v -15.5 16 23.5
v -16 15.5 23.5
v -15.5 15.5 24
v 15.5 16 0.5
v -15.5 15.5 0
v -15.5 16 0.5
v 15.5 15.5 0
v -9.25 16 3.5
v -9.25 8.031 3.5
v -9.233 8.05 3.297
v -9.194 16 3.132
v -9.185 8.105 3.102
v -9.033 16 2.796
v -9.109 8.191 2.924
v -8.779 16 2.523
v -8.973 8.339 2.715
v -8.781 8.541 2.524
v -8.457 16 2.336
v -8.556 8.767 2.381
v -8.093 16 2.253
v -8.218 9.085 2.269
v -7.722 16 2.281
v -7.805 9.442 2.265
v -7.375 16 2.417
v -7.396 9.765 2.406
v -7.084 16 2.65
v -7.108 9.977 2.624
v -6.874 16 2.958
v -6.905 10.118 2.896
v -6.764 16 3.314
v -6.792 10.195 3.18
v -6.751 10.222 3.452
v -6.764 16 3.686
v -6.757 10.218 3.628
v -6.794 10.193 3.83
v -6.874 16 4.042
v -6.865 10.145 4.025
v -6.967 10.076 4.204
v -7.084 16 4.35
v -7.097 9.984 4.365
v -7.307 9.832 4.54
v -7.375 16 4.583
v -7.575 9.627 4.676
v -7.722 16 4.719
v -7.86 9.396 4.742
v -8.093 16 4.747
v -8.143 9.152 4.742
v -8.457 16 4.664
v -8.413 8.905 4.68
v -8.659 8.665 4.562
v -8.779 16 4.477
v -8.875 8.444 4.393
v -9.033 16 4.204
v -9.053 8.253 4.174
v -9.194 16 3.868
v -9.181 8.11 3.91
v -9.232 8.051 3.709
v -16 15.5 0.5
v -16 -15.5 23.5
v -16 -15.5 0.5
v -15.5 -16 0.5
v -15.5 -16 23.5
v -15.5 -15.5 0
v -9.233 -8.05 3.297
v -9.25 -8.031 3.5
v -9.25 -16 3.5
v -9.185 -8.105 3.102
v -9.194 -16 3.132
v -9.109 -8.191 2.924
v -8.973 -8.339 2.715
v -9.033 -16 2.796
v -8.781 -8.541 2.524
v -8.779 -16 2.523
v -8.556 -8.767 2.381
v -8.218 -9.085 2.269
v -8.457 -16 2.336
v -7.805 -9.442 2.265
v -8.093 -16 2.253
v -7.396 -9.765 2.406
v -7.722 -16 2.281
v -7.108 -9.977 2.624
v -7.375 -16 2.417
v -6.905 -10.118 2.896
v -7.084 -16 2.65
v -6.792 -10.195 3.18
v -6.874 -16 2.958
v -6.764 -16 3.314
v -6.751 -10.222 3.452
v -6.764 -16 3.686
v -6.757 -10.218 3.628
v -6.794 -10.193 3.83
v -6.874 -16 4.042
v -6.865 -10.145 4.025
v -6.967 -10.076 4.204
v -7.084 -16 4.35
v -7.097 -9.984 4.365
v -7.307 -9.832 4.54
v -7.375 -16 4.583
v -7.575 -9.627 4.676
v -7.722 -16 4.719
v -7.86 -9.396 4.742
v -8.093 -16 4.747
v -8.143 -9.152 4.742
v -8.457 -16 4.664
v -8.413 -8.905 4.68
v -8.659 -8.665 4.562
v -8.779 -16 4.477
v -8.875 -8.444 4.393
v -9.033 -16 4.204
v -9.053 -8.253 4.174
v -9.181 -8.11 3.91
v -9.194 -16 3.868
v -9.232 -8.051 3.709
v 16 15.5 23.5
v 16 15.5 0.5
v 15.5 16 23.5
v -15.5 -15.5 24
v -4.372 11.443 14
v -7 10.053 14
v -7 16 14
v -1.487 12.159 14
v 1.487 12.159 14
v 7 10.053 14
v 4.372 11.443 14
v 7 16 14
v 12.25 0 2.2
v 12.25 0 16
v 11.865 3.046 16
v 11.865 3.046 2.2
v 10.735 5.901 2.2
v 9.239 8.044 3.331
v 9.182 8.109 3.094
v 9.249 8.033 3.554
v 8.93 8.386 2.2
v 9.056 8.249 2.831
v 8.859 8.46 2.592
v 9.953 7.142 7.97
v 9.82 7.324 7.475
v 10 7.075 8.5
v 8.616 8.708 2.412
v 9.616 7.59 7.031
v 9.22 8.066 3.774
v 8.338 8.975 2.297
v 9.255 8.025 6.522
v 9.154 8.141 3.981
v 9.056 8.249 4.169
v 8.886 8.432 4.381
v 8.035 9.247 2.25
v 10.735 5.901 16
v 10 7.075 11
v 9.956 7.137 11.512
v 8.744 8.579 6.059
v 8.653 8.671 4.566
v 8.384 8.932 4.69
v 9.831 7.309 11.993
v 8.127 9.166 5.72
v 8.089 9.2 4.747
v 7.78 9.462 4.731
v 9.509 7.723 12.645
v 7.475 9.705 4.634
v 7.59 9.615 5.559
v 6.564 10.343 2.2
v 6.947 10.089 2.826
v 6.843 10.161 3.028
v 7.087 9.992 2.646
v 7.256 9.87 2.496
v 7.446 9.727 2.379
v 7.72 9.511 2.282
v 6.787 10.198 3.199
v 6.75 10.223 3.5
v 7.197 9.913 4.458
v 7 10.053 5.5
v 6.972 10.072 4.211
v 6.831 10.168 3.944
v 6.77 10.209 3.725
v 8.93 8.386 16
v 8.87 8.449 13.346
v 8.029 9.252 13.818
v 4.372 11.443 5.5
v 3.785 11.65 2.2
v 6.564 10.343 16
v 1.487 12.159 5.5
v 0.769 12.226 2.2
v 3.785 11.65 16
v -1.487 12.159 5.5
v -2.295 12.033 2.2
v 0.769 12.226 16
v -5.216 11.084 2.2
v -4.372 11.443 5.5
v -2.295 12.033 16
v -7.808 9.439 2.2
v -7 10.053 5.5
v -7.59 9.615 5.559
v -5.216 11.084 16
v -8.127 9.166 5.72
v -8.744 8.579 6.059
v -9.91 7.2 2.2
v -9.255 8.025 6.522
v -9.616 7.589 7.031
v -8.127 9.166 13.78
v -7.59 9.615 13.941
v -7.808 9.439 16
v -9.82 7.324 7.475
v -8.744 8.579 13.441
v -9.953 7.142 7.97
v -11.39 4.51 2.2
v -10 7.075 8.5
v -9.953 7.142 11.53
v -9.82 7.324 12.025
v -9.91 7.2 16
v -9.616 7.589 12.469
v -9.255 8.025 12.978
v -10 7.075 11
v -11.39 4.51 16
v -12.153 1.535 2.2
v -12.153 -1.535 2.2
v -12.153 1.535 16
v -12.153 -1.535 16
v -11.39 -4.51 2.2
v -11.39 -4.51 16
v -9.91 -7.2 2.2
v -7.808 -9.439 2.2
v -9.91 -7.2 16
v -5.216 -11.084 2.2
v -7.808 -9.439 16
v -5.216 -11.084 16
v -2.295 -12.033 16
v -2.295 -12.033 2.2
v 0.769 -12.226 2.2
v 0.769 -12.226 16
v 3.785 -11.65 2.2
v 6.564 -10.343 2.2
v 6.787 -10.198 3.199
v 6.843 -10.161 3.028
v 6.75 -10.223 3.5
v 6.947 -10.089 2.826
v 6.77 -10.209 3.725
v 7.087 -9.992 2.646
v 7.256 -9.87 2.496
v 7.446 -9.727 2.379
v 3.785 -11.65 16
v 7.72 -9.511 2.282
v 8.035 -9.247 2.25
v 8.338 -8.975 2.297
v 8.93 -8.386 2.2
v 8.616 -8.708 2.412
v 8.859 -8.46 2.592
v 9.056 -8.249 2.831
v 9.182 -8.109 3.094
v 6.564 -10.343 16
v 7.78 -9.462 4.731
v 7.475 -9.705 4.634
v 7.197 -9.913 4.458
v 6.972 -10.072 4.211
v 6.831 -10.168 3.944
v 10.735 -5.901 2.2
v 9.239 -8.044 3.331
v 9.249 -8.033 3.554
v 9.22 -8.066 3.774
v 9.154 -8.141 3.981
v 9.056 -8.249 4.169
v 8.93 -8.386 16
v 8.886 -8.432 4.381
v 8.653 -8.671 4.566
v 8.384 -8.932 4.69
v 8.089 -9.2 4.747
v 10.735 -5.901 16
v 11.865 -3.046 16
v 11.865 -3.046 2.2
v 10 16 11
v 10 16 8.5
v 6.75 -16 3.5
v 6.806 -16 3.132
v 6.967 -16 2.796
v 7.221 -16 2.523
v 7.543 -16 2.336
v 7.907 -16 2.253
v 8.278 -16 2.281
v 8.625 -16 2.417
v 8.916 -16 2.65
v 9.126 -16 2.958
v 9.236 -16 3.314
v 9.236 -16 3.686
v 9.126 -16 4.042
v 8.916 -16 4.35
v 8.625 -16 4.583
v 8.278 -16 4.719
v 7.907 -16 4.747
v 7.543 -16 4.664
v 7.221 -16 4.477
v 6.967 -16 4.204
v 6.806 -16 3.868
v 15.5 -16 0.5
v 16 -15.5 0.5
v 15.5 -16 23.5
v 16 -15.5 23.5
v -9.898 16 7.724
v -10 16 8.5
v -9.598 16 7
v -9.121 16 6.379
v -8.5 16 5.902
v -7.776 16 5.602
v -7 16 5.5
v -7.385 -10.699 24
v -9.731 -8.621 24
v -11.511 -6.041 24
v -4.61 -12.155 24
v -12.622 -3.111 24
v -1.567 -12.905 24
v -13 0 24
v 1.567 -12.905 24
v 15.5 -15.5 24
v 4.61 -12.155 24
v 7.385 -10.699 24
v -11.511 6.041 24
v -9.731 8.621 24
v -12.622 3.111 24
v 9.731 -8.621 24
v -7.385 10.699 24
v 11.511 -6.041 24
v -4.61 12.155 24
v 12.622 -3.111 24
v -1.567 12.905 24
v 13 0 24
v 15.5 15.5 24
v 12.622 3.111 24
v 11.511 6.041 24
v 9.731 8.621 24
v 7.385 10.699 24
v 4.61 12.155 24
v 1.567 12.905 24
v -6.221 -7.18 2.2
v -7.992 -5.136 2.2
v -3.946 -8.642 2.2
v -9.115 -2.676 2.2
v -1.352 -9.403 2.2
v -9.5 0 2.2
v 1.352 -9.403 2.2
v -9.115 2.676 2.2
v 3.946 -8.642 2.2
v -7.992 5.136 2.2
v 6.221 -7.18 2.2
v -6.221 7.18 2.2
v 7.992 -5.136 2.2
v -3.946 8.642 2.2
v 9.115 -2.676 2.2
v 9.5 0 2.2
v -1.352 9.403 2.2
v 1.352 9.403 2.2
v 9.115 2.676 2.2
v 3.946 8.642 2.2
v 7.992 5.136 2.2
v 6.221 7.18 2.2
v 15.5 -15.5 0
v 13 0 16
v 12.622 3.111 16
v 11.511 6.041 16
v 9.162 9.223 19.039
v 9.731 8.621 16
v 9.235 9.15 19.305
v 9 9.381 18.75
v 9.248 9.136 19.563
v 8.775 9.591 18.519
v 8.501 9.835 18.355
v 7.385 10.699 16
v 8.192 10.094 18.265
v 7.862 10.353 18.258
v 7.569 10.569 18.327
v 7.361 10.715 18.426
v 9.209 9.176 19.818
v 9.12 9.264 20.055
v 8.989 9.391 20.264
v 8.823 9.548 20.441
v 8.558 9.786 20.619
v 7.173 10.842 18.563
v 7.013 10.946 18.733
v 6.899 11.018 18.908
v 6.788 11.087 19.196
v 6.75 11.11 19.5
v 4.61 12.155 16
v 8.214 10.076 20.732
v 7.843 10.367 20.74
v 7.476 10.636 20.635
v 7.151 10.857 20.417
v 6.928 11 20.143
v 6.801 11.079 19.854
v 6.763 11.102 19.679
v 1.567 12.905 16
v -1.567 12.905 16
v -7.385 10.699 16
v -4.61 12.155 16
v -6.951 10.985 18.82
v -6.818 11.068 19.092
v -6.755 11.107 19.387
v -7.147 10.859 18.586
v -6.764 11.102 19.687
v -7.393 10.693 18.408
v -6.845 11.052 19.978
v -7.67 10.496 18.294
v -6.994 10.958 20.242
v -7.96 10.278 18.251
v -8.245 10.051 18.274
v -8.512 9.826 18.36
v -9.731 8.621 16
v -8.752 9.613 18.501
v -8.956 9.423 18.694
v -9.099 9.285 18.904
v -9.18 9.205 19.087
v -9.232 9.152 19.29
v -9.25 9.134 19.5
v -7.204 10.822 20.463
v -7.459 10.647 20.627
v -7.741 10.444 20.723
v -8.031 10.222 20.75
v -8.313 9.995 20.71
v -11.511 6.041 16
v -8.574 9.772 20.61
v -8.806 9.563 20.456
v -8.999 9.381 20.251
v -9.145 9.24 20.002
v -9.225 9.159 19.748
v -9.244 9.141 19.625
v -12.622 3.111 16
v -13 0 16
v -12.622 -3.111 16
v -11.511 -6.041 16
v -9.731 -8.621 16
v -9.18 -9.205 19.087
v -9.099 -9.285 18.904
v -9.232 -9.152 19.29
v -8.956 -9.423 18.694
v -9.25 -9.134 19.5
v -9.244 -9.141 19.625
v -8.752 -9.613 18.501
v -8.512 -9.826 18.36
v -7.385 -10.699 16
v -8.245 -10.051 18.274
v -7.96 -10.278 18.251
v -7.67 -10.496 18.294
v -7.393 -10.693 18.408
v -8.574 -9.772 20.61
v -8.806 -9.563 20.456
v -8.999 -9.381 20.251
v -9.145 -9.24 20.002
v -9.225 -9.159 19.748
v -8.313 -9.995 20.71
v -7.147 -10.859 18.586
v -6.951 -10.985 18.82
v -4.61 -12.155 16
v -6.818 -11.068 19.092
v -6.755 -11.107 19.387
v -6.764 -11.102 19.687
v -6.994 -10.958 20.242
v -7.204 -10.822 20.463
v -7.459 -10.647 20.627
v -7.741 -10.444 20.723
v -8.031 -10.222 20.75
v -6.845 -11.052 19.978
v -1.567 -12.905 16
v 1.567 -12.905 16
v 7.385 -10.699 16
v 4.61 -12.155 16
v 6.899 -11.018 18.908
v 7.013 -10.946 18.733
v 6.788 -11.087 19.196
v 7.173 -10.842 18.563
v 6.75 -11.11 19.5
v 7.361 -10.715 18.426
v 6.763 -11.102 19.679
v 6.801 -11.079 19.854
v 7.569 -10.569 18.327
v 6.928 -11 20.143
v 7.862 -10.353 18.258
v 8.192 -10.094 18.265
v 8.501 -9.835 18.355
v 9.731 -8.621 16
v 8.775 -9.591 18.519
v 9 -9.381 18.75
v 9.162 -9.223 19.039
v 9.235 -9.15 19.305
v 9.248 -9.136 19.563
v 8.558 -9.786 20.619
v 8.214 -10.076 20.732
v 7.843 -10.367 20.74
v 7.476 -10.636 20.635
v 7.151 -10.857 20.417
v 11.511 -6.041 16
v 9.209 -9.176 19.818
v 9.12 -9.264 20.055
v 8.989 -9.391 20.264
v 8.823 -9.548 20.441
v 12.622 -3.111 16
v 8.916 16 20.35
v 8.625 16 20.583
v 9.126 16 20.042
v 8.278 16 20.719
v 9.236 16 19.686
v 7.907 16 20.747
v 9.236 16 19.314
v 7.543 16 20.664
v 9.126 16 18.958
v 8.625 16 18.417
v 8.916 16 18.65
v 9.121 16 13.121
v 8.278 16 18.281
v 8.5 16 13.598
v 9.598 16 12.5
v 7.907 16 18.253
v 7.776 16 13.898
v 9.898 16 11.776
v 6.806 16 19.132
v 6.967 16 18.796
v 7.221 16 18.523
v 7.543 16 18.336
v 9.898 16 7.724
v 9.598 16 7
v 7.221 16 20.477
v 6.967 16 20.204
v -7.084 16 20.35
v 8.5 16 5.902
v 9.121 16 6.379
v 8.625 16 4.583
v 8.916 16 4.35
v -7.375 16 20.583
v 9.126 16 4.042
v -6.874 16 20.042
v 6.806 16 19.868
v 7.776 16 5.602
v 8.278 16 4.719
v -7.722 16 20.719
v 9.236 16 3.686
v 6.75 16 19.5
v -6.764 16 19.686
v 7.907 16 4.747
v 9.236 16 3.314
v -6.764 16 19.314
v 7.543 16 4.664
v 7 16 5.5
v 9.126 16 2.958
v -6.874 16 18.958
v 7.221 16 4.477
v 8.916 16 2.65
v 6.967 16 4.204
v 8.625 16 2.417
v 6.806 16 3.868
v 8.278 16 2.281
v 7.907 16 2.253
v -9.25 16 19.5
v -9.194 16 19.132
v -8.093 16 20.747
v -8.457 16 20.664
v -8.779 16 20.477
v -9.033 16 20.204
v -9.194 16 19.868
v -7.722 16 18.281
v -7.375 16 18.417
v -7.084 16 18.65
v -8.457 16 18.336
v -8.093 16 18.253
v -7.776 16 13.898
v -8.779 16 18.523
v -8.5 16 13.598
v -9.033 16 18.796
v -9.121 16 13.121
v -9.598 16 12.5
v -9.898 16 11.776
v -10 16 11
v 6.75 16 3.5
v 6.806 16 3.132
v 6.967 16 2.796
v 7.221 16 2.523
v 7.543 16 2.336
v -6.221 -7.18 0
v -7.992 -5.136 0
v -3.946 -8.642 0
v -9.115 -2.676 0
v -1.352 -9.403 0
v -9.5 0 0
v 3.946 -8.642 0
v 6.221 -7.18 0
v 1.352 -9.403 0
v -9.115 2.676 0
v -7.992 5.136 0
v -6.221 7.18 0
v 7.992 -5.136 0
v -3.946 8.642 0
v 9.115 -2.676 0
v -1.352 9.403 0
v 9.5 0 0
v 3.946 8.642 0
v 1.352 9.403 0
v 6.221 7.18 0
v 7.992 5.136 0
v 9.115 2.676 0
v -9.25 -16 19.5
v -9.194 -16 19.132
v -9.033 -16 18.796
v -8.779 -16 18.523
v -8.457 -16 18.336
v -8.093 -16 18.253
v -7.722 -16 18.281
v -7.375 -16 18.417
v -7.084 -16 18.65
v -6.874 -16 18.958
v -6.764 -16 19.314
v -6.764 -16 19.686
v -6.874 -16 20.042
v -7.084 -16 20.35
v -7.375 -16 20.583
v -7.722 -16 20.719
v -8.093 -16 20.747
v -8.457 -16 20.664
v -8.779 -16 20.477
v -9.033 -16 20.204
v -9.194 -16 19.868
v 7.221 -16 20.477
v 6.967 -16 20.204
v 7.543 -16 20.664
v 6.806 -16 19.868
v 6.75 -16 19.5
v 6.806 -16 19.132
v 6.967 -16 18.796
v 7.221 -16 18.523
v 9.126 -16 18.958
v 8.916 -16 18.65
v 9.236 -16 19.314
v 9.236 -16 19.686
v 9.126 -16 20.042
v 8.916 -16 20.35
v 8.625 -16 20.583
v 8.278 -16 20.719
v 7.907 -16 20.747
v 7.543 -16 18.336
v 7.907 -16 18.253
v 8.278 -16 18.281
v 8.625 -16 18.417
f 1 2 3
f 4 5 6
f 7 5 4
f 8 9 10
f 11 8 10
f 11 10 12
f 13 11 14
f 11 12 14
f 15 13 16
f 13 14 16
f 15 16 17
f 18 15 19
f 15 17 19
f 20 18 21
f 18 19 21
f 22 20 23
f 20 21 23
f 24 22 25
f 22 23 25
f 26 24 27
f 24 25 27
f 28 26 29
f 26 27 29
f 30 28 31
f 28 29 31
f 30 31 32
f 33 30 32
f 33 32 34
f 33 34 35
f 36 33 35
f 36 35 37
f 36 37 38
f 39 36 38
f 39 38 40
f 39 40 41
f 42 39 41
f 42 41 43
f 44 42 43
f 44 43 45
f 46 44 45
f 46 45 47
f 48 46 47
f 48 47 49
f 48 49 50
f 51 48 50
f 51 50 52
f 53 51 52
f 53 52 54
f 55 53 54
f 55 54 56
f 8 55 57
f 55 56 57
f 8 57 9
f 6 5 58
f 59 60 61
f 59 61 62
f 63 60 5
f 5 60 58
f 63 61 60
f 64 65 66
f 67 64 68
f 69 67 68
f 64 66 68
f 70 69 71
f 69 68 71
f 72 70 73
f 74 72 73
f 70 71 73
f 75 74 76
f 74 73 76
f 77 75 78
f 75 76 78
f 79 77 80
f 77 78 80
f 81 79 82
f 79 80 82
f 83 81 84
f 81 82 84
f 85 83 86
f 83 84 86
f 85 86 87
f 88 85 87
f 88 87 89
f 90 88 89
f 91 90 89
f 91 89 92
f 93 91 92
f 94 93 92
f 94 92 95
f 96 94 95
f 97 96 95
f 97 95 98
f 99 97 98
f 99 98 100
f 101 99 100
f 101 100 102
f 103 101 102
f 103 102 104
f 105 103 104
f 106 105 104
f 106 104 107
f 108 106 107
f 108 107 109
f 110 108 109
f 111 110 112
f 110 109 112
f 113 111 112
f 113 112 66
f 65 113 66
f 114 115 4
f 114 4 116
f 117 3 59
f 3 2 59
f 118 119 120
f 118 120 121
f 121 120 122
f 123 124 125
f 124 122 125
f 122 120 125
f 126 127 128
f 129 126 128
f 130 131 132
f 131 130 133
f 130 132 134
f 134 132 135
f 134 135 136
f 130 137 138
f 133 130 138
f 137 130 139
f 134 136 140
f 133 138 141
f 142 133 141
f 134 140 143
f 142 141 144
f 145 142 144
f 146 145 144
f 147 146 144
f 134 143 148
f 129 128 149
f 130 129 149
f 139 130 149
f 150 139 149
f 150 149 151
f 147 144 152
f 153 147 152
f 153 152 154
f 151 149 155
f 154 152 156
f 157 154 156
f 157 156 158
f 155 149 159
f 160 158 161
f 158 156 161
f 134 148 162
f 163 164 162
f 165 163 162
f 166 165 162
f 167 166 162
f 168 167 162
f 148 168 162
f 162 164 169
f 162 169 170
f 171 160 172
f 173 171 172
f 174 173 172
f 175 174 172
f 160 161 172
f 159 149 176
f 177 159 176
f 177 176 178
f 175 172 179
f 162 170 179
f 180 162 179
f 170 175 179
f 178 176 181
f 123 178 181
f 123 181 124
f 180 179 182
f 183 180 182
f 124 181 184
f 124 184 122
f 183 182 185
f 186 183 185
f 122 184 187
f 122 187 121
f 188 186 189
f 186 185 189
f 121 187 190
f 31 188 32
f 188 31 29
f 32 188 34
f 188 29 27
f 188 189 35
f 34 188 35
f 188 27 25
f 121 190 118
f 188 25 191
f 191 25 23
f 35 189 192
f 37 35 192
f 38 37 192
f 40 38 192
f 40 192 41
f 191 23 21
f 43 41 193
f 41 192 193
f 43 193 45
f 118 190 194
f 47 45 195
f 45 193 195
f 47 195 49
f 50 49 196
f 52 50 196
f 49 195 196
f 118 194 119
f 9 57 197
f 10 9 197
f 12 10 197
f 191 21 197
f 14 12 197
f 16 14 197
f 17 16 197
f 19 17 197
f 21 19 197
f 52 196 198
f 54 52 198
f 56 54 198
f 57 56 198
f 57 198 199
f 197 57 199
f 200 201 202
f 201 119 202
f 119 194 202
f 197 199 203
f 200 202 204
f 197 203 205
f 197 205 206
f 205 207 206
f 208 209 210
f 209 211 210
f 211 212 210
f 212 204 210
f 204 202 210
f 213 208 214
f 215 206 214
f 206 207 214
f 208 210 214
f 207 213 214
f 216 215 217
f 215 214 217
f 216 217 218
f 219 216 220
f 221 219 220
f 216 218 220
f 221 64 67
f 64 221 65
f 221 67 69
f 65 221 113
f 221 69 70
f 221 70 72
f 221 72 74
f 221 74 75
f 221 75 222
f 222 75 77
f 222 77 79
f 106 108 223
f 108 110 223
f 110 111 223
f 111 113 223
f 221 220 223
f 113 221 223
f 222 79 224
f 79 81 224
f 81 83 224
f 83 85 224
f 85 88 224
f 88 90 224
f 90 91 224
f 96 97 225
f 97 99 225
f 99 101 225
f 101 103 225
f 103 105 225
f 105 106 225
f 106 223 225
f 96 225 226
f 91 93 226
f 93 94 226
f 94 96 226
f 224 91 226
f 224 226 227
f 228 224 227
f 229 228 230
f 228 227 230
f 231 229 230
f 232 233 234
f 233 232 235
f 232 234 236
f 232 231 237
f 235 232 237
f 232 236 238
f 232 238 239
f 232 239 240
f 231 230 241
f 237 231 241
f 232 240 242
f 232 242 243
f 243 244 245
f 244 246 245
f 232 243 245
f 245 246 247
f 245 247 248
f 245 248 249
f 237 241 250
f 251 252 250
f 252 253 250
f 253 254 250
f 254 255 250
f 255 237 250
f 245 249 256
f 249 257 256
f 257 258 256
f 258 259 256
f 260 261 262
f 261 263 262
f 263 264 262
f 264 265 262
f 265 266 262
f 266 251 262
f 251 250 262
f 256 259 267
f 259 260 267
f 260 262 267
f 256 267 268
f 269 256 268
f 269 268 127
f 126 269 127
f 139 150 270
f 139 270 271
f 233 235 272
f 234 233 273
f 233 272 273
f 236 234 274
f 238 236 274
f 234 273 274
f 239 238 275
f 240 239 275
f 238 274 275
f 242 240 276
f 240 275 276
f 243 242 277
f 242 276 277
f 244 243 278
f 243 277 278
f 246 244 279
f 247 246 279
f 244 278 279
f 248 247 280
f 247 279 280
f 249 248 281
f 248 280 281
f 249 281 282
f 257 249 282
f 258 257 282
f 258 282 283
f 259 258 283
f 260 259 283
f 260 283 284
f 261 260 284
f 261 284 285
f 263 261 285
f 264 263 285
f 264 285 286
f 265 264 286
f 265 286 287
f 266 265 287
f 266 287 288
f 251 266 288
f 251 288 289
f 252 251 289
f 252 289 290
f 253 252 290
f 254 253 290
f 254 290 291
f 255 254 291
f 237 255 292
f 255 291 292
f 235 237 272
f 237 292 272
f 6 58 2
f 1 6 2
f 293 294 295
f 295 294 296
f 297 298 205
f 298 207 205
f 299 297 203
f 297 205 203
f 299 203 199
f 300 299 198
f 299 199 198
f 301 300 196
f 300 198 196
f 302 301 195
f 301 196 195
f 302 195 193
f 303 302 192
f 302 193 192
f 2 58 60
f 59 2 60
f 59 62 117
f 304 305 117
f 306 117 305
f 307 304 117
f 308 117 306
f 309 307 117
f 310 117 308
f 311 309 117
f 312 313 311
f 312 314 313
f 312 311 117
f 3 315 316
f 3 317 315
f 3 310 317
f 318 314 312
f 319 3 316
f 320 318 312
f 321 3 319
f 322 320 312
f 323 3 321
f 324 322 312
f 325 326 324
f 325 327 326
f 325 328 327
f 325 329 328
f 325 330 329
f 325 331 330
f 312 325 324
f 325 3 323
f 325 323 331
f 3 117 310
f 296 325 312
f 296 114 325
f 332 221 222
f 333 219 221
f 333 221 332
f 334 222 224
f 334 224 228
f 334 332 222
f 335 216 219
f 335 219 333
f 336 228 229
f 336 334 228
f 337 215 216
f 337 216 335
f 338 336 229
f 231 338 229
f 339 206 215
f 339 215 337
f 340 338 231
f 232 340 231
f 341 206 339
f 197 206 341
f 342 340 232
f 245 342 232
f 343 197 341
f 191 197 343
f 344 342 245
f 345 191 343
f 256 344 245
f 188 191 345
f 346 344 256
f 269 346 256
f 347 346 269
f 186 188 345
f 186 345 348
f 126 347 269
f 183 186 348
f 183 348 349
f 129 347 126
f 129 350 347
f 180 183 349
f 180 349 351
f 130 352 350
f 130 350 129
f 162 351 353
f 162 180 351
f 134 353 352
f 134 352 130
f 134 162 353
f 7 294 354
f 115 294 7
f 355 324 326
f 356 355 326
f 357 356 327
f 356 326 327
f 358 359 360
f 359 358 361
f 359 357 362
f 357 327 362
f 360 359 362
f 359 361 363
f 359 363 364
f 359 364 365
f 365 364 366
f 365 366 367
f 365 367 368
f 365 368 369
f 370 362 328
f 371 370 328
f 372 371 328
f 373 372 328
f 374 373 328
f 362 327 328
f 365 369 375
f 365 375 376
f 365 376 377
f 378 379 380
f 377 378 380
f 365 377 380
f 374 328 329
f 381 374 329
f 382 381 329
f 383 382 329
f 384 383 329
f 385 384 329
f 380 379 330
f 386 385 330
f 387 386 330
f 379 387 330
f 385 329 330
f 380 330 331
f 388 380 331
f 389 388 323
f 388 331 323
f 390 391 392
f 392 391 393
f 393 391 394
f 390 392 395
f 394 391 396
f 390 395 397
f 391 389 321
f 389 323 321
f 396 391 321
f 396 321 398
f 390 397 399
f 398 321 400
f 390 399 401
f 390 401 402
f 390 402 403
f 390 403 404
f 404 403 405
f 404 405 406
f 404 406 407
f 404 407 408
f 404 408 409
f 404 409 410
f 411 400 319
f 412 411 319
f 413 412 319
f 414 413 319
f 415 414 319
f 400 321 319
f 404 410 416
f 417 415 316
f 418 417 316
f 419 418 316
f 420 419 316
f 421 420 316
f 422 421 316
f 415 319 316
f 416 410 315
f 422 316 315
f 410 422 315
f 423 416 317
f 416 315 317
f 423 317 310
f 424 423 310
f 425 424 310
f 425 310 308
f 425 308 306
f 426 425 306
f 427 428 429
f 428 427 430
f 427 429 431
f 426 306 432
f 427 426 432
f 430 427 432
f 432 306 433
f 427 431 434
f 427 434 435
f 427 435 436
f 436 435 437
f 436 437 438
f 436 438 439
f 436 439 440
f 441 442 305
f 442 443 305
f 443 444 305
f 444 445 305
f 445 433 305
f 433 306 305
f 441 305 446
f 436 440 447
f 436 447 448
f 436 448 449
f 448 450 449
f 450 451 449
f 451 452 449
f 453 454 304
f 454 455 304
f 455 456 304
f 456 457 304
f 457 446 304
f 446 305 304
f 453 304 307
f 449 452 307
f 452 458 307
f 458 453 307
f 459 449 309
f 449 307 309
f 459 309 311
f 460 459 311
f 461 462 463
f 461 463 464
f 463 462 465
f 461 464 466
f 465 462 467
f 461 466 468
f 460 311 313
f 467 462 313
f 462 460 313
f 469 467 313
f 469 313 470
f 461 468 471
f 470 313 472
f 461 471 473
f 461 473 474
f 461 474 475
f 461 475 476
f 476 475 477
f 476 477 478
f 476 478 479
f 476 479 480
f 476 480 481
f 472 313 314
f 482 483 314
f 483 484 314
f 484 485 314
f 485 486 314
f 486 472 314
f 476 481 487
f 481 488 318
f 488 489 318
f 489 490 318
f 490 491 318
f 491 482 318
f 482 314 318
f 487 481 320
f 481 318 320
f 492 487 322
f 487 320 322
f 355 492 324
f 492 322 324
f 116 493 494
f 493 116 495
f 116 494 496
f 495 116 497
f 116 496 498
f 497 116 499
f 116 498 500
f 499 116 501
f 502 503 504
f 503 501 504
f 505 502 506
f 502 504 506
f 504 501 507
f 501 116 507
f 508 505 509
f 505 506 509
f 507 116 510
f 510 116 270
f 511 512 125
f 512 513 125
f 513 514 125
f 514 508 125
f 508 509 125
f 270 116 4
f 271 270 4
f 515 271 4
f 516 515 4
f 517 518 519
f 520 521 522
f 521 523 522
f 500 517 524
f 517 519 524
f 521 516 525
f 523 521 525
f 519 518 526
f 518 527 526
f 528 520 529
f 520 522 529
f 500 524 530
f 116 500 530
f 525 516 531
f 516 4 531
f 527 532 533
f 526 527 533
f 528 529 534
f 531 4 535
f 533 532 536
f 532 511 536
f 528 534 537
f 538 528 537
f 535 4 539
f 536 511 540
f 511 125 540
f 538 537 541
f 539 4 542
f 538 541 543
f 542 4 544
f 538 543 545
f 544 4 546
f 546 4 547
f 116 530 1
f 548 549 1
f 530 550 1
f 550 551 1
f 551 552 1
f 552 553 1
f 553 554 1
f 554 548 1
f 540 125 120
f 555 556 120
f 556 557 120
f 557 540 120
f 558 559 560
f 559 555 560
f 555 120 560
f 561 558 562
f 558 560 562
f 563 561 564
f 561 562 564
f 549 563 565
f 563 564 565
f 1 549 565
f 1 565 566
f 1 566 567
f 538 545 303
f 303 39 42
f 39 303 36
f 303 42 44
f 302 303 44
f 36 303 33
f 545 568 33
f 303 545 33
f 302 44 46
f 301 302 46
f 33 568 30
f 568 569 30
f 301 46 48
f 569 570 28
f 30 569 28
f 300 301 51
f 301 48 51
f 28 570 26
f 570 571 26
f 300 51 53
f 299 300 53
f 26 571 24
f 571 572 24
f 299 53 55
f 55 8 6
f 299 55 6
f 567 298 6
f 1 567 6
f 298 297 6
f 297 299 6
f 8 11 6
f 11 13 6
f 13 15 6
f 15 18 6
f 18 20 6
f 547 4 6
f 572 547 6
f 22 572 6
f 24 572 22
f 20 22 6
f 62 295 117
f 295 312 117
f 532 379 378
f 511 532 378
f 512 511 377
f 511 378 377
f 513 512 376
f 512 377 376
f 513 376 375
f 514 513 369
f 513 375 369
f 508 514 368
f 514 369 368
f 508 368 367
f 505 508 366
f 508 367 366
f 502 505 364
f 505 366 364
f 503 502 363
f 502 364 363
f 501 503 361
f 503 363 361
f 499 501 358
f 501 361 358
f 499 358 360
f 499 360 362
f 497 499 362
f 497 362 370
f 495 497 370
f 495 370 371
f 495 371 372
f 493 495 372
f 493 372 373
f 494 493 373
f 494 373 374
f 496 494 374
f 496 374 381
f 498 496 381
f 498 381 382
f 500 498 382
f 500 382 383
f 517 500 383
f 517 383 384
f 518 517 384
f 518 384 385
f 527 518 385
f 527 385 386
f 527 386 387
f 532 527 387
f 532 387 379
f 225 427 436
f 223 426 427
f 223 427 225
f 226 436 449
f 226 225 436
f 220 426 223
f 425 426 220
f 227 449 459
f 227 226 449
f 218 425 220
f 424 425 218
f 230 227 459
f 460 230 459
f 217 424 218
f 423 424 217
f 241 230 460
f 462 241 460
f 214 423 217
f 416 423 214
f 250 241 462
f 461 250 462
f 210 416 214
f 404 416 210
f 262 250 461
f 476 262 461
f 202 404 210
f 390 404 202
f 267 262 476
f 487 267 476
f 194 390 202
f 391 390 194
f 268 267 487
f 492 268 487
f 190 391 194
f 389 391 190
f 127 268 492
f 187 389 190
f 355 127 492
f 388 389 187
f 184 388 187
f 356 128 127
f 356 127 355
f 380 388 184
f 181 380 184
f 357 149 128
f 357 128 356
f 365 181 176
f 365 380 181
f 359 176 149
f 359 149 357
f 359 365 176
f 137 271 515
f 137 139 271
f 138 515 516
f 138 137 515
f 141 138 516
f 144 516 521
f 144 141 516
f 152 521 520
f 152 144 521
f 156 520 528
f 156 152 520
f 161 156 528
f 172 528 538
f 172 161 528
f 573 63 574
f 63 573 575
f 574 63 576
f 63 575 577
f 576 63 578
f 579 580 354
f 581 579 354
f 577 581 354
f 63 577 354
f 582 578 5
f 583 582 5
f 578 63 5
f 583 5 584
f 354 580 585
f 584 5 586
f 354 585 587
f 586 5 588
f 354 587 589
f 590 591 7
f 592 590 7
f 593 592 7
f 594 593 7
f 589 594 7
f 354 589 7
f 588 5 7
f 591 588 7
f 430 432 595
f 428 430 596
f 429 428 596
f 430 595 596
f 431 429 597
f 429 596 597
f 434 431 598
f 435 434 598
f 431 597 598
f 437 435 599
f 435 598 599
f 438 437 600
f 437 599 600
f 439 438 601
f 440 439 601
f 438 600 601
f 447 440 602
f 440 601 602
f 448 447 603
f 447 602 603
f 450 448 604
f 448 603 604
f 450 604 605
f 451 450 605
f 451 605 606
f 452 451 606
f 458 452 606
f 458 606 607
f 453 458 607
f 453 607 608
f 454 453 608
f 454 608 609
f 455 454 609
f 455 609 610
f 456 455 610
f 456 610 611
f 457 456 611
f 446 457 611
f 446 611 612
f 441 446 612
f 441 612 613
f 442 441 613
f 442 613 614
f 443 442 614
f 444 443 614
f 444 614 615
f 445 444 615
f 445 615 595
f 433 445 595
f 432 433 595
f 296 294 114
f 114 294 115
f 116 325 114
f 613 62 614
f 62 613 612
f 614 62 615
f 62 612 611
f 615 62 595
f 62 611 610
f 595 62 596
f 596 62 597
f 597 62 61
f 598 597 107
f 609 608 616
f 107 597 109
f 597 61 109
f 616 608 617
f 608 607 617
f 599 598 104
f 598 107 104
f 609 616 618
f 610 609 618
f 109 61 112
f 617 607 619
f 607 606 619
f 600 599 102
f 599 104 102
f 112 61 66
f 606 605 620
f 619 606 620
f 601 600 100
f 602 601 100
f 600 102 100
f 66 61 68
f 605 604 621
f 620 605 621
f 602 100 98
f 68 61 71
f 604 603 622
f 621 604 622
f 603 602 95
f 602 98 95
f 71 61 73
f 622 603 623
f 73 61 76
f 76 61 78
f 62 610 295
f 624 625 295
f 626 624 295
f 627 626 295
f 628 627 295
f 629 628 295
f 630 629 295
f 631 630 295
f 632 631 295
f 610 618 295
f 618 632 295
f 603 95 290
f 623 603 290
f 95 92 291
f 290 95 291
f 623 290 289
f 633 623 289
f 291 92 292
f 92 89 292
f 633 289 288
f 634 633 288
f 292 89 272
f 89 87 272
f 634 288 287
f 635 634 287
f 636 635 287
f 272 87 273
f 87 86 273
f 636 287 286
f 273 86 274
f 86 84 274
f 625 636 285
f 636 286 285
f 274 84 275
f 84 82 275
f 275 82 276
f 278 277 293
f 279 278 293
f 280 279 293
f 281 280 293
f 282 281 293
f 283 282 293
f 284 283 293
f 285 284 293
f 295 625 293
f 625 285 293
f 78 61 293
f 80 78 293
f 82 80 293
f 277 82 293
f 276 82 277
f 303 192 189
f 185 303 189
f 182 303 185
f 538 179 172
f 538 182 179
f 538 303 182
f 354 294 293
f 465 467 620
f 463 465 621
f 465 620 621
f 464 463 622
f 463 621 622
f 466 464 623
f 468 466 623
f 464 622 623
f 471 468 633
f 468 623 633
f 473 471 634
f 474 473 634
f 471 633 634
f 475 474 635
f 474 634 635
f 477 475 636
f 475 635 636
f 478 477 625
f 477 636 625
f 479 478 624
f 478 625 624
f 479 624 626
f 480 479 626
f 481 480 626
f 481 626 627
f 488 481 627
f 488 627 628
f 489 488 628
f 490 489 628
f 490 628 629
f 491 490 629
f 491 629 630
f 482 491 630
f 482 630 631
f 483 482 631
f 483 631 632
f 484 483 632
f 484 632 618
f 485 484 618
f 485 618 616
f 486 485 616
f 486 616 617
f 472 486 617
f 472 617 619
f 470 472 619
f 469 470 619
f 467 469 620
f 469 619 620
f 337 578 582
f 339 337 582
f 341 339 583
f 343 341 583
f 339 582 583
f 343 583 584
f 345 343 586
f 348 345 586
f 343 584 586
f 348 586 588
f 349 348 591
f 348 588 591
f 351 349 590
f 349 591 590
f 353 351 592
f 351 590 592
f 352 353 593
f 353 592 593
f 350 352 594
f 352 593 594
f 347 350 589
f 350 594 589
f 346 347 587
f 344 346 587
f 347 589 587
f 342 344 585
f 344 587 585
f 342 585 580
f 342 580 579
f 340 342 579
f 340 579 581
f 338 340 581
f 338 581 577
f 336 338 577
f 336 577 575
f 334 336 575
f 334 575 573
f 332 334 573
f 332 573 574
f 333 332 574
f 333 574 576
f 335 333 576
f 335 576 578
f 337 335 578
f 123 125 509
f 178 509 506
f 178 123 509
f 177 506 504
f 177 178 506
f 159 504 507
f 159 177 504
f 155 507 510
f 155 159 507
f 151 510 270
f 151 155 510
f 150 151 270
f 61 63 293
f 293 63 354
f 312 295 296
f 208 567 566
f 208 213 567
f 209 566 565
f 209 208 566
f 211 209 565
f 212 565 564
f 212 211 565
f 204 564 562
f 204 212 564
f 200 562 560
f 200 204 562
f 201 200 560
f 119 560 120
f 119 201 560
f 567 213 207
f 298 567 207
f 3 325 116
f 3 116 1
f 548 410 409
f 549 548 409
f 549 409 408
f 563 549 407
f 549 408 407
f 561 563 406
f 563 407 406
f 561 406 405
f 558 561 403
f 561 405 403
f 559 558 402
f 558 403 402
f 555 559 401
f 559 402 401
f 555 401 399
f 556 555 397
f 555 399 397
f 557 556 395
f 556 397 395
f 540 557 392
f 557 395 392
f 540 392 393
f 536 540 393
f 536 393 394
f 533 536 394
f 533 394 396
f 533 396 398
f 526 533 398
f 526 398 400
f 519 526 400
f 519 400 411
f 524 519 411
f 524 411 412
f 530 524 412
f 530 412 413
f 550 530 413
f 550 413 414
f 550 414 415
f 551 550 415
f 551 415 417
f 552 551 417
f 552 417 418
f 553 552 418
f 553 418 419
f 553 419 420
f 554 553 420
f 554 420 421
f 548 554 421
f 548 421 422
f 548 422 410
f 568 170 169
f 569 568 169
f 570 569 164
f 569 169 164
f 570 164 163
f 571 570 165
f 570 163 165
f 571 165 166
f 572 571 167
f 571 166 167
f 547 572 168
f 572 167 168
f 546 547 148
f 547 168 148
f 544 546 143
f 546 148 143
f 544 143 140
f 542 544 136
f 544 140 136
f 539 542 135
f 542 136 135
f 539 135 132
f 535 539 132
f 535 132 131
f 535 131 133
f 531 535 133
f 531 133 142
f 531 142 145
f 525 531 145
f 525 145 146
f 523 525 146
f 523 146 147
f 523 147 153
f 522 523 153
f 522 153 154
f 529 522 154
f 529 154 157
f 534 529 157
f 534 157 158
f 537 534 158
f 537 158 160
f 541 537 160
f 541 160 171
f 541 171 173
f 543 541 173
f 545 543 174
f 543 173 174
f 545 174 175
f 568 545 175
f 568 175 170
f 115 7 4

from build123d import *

# Parameters (mm, degrees)
SKETCH_1_R               = 16
SKETCH_1_R_2             = 6.65
EXTRUDE_1_DEPTH          = 24
SKETCH_3_R               = 1.5
CUT_EXTRUDE_2_DEPTH      = 33.984845005
PATTERN_CIRCULAR_1_COUNT = 6
EXTRUDE_START            = -24
EXTRUDE_2_DEPTH          = 24
SKETCH_7_R               = 13
CUT_EXTRUDE_3_DEPTH      = 21.8
EXTRUDE_START_2          = 13.8
SKETCH_15_R              = 13
SKETCH_15_R_2            = 12.25
EXTRUDE_4_DEPTH          = 13.8
SKETCH_11_W              = 20
SKETCH_11_H              = 8.5
CUT_EXTRUDE_4_DEPTH      = 10
FILLET_1_R               = 3
SKETCH_12_R              = 1
CUT_EXTRUDE_5_DEPTH      = 44.081318457
HOLE_WIZARD_M3_1_D       = 2.5
CHAMFER_1_SIZE           = 0.5
SKETCH_19_R              = 11
EXTRUDE_8_DEPTH          = 24
SKETCH_20_R              = 11
CUT_EXTRUDE_8_DEPTH      = 47
SKETCH_21_R              = 11
CUT_EXTRUDE_9_DEPTH      = 60
SKETCH_22_R              = 9.5
CUT_EXTRUDE_10_DEPTH     = 60


with BuildPart() as part:
    # 草图1 → 凸台-拉伸1 (new body)
    with BuildSketch(Plane.XY):
        Circle(SKETCH_1_R)
        Circle(SKETCH_1_R_2, mode=Mode.SUBTRACT)
    extrude(amount=EXTRUDE_1_DEPTH)

    # 草图3 → 切除-拉伸2 (cut, through all)
    with BuildSketch(Plane(origin=(0, 0, 0), x_dir=(-1, 0, 0), z_dir=(0, 0, -1))):
        with Locations((0, 9.5)):
            Circle(SKETCH_3_R)
    cut_extrude_2 = extrude(amount=-CUT_EXTRUDE_2_DEPTH, mode=Mode.SUBTRACT)

    # 阵列(圆周)1: 切除-拉伸2 ×6 about axis
    pattern_circular_1_axis = Axis((0, 0, 0), (0, 0, 1))
    for i in range(1, PATTERN_CIRCULAR_1_COUNT):
        add(cut_extrude_2.rotate(pattern_circular_1_axis, i * 360 / PATTERN_CIRCULAR_1_COUNT), mode=Mode.SUBTRACT)

    # 草图4 → 凸台-拉伸2 (add)
    with BuildSketch(Plane.XY.offset(24).offset(EXTRUDE_START)):
        with BuildLine():
            ThreePointArc((16, 0), (11.313708518, -11.31370848), (5.5e-08, -16))
            Line((5.5e-08, -16), (16, -16))
            Line((16, -16), (16, 0))
        make_face()
        with BuildLine():
            ThreePointArc((5.5e-08, -16), (-11.31370848, -11.313708518), (-16, 0))
            Line((-16, 0), (-16, -16))
            Line((-16, -16), (5.5e-08, -16))
        make_face()
        with BuildLine():
            Line((-16, 16), (-16, 0))
            ThreePointArc((-16, 0), (-11.313708518, 11.31370848), (-5.5e-08, 16))
            Line((-5.5e-08, 16), (-16, 16))
        make_face()
        with BuildLine():
            Line((16, 16), (-5.5e-08, 16))
            ThreePointArc((-5.5e-08, 16), (11.31370848, 11.313708518), (16, 0))
            Line((16, 0), (16, 16))
        make_face()
    extrude(amount=EXTRUDE_2_DEPTH)

    # 草图7 → 切除-拉伸3 (cut)
    with BuildSketch(Plane.XY.offset(24)):
        Circle(SKETCH_7_R)
    extrude(amount=-CUT_EXTRUDE_3_DEPTH, mode=Mode.SUBTRACT)

    # 草图15 → 凸台-拉伸4 (add)
    with BuildSketch(Plane.XY.offset(2.2).offset(EXTRUDE_START_2)):
        Circle(SKETCH_15_R)
        Circle(SKETCH_15_R_2, mode=Mode.SUBTRACT)
    extrude(amount=-EXTRUDE_4_DEPTH)

    # 草图11 → 切除-拉伸4 (cut)
    with BuildSketch(Plane(origin=(0, 16, 0), x_dir=(1, 0, 0), z_dir=(0, 1, 0))):
        with Locations((0, -9.75)):
            Rectangle(SKETCH_11_W, SKETCH_11_H)
    extrude(amount=-CUT_EXTRUDE_4_DEPTH, mode=Mode.SUBTRACT)

    # 圆角1
    fillet_1_edges = [part.edges().sort_by_distance(p)[0] for p in [
        (10, 11.537742925, 5.5),
        (10, 11.537742925, 14),
        (-10, 11.537742925, 14),
        (-10, 11.537742925, 5.5),
    ]]
    fillet(fillet_1_edges, radius=FILLET_1_R)

    # 草图12 → 切除-拉伸5 (cut, through all)
    with BuildSketch(Plane(origin=(0, 16, 0), x_dir=(1, 0, 0), z_dir=(0, 1, 0))):
        with Locations(Location((8, -3.5, 0), (0, 0, 180))):
            Circle(SKETCH_12_R)
        with Locations(Location((8, -19.5, 0), (0, 0, 180))):
            Circle(SKETCH_12_R)
        with Locations(Location((-8, -3.5, 0), (0, 0, 180))):
            Circle(SKETCH_12_R)
        with Locations(Location((-8, -19.5, 0), (0, 0, 180))):
            Circle(SKETCH_12_R)
    extrude(amount=-CUT_EXTRUDE_5_DEPTH, mode=Mode.SUBTRACT)

    # M3 螺纹孔1 (through all)
    with Locations(Plane(origin=(0, 16, 0), x_dir=(1, 0, 0), z_dir=(0, 1, 0))):
        with Locations((8, -3.5), (-8, -3.5), (-8, -19.5), (8, -19.5)):
            Hole(HOLE_WIZARD_M3_1_D / 2)

    # 倒角1
    chamfer_1_edges = [part.edges().sort_by_distance(p)[0] for p in [
        (0, -16, 24),
        (16, -16, 12),
        (16, 0, 0),
        (16, 0, 24),
        (0, -16, 0),
        (-16, -16, 12),
        (-16, 0, 24),
        (-16, 0, 0),
        (0, 16, 0),
        (-16, 16, 12),
        (0, 16, 24),
        (16, 16, 12),
    ]]
    chamfer(chamfer_1_edges, length=CHAMFER_1_SIZE)

    # 草图19 → 凸台-拉伸8 (add)
    with BuildSketch(Plane(origin=(0, 0, 0), x_dir=(-1, 0, 0), z_dir=(0, 0, -1))):
        Circle(SKETCH_19_R)
    extrude(amount=-EXTRUDE_8_DEPTH)

    # 草图20 → 切除-拉伸8 (cut)
    with BuildSketch(Plane.XY.offset(5.5)):
        Circle(SKETCH_20_R)
    extrude(amount=CUT_EXTRUDE_8_DEPTH, mode=Mode.SUBTRACT)

    # 草图21 → 切除-拉伸9 (cut)
    with BuildSketch(Plane.XY.offset(2.2)):
        Circle(SKETCH_21_R)
    extrude(amount=CUT_EXTRUDE_9_DEPTH, mode=Mode.SUBTRACT)

    # 草图22 → 切除-拉伸10 (cut)
    with BuildSketch(Plane(origin=(0, 0, 0), x_dir=(-1, 0, 0), z_dir=(0, 0, -1))):
        Circle(SKETCH_22_R)
    extrude(amount=-CUT_EXTRUDE_10_DEPTH, mode=Mode.SUBTRACT)


solid = part.part
